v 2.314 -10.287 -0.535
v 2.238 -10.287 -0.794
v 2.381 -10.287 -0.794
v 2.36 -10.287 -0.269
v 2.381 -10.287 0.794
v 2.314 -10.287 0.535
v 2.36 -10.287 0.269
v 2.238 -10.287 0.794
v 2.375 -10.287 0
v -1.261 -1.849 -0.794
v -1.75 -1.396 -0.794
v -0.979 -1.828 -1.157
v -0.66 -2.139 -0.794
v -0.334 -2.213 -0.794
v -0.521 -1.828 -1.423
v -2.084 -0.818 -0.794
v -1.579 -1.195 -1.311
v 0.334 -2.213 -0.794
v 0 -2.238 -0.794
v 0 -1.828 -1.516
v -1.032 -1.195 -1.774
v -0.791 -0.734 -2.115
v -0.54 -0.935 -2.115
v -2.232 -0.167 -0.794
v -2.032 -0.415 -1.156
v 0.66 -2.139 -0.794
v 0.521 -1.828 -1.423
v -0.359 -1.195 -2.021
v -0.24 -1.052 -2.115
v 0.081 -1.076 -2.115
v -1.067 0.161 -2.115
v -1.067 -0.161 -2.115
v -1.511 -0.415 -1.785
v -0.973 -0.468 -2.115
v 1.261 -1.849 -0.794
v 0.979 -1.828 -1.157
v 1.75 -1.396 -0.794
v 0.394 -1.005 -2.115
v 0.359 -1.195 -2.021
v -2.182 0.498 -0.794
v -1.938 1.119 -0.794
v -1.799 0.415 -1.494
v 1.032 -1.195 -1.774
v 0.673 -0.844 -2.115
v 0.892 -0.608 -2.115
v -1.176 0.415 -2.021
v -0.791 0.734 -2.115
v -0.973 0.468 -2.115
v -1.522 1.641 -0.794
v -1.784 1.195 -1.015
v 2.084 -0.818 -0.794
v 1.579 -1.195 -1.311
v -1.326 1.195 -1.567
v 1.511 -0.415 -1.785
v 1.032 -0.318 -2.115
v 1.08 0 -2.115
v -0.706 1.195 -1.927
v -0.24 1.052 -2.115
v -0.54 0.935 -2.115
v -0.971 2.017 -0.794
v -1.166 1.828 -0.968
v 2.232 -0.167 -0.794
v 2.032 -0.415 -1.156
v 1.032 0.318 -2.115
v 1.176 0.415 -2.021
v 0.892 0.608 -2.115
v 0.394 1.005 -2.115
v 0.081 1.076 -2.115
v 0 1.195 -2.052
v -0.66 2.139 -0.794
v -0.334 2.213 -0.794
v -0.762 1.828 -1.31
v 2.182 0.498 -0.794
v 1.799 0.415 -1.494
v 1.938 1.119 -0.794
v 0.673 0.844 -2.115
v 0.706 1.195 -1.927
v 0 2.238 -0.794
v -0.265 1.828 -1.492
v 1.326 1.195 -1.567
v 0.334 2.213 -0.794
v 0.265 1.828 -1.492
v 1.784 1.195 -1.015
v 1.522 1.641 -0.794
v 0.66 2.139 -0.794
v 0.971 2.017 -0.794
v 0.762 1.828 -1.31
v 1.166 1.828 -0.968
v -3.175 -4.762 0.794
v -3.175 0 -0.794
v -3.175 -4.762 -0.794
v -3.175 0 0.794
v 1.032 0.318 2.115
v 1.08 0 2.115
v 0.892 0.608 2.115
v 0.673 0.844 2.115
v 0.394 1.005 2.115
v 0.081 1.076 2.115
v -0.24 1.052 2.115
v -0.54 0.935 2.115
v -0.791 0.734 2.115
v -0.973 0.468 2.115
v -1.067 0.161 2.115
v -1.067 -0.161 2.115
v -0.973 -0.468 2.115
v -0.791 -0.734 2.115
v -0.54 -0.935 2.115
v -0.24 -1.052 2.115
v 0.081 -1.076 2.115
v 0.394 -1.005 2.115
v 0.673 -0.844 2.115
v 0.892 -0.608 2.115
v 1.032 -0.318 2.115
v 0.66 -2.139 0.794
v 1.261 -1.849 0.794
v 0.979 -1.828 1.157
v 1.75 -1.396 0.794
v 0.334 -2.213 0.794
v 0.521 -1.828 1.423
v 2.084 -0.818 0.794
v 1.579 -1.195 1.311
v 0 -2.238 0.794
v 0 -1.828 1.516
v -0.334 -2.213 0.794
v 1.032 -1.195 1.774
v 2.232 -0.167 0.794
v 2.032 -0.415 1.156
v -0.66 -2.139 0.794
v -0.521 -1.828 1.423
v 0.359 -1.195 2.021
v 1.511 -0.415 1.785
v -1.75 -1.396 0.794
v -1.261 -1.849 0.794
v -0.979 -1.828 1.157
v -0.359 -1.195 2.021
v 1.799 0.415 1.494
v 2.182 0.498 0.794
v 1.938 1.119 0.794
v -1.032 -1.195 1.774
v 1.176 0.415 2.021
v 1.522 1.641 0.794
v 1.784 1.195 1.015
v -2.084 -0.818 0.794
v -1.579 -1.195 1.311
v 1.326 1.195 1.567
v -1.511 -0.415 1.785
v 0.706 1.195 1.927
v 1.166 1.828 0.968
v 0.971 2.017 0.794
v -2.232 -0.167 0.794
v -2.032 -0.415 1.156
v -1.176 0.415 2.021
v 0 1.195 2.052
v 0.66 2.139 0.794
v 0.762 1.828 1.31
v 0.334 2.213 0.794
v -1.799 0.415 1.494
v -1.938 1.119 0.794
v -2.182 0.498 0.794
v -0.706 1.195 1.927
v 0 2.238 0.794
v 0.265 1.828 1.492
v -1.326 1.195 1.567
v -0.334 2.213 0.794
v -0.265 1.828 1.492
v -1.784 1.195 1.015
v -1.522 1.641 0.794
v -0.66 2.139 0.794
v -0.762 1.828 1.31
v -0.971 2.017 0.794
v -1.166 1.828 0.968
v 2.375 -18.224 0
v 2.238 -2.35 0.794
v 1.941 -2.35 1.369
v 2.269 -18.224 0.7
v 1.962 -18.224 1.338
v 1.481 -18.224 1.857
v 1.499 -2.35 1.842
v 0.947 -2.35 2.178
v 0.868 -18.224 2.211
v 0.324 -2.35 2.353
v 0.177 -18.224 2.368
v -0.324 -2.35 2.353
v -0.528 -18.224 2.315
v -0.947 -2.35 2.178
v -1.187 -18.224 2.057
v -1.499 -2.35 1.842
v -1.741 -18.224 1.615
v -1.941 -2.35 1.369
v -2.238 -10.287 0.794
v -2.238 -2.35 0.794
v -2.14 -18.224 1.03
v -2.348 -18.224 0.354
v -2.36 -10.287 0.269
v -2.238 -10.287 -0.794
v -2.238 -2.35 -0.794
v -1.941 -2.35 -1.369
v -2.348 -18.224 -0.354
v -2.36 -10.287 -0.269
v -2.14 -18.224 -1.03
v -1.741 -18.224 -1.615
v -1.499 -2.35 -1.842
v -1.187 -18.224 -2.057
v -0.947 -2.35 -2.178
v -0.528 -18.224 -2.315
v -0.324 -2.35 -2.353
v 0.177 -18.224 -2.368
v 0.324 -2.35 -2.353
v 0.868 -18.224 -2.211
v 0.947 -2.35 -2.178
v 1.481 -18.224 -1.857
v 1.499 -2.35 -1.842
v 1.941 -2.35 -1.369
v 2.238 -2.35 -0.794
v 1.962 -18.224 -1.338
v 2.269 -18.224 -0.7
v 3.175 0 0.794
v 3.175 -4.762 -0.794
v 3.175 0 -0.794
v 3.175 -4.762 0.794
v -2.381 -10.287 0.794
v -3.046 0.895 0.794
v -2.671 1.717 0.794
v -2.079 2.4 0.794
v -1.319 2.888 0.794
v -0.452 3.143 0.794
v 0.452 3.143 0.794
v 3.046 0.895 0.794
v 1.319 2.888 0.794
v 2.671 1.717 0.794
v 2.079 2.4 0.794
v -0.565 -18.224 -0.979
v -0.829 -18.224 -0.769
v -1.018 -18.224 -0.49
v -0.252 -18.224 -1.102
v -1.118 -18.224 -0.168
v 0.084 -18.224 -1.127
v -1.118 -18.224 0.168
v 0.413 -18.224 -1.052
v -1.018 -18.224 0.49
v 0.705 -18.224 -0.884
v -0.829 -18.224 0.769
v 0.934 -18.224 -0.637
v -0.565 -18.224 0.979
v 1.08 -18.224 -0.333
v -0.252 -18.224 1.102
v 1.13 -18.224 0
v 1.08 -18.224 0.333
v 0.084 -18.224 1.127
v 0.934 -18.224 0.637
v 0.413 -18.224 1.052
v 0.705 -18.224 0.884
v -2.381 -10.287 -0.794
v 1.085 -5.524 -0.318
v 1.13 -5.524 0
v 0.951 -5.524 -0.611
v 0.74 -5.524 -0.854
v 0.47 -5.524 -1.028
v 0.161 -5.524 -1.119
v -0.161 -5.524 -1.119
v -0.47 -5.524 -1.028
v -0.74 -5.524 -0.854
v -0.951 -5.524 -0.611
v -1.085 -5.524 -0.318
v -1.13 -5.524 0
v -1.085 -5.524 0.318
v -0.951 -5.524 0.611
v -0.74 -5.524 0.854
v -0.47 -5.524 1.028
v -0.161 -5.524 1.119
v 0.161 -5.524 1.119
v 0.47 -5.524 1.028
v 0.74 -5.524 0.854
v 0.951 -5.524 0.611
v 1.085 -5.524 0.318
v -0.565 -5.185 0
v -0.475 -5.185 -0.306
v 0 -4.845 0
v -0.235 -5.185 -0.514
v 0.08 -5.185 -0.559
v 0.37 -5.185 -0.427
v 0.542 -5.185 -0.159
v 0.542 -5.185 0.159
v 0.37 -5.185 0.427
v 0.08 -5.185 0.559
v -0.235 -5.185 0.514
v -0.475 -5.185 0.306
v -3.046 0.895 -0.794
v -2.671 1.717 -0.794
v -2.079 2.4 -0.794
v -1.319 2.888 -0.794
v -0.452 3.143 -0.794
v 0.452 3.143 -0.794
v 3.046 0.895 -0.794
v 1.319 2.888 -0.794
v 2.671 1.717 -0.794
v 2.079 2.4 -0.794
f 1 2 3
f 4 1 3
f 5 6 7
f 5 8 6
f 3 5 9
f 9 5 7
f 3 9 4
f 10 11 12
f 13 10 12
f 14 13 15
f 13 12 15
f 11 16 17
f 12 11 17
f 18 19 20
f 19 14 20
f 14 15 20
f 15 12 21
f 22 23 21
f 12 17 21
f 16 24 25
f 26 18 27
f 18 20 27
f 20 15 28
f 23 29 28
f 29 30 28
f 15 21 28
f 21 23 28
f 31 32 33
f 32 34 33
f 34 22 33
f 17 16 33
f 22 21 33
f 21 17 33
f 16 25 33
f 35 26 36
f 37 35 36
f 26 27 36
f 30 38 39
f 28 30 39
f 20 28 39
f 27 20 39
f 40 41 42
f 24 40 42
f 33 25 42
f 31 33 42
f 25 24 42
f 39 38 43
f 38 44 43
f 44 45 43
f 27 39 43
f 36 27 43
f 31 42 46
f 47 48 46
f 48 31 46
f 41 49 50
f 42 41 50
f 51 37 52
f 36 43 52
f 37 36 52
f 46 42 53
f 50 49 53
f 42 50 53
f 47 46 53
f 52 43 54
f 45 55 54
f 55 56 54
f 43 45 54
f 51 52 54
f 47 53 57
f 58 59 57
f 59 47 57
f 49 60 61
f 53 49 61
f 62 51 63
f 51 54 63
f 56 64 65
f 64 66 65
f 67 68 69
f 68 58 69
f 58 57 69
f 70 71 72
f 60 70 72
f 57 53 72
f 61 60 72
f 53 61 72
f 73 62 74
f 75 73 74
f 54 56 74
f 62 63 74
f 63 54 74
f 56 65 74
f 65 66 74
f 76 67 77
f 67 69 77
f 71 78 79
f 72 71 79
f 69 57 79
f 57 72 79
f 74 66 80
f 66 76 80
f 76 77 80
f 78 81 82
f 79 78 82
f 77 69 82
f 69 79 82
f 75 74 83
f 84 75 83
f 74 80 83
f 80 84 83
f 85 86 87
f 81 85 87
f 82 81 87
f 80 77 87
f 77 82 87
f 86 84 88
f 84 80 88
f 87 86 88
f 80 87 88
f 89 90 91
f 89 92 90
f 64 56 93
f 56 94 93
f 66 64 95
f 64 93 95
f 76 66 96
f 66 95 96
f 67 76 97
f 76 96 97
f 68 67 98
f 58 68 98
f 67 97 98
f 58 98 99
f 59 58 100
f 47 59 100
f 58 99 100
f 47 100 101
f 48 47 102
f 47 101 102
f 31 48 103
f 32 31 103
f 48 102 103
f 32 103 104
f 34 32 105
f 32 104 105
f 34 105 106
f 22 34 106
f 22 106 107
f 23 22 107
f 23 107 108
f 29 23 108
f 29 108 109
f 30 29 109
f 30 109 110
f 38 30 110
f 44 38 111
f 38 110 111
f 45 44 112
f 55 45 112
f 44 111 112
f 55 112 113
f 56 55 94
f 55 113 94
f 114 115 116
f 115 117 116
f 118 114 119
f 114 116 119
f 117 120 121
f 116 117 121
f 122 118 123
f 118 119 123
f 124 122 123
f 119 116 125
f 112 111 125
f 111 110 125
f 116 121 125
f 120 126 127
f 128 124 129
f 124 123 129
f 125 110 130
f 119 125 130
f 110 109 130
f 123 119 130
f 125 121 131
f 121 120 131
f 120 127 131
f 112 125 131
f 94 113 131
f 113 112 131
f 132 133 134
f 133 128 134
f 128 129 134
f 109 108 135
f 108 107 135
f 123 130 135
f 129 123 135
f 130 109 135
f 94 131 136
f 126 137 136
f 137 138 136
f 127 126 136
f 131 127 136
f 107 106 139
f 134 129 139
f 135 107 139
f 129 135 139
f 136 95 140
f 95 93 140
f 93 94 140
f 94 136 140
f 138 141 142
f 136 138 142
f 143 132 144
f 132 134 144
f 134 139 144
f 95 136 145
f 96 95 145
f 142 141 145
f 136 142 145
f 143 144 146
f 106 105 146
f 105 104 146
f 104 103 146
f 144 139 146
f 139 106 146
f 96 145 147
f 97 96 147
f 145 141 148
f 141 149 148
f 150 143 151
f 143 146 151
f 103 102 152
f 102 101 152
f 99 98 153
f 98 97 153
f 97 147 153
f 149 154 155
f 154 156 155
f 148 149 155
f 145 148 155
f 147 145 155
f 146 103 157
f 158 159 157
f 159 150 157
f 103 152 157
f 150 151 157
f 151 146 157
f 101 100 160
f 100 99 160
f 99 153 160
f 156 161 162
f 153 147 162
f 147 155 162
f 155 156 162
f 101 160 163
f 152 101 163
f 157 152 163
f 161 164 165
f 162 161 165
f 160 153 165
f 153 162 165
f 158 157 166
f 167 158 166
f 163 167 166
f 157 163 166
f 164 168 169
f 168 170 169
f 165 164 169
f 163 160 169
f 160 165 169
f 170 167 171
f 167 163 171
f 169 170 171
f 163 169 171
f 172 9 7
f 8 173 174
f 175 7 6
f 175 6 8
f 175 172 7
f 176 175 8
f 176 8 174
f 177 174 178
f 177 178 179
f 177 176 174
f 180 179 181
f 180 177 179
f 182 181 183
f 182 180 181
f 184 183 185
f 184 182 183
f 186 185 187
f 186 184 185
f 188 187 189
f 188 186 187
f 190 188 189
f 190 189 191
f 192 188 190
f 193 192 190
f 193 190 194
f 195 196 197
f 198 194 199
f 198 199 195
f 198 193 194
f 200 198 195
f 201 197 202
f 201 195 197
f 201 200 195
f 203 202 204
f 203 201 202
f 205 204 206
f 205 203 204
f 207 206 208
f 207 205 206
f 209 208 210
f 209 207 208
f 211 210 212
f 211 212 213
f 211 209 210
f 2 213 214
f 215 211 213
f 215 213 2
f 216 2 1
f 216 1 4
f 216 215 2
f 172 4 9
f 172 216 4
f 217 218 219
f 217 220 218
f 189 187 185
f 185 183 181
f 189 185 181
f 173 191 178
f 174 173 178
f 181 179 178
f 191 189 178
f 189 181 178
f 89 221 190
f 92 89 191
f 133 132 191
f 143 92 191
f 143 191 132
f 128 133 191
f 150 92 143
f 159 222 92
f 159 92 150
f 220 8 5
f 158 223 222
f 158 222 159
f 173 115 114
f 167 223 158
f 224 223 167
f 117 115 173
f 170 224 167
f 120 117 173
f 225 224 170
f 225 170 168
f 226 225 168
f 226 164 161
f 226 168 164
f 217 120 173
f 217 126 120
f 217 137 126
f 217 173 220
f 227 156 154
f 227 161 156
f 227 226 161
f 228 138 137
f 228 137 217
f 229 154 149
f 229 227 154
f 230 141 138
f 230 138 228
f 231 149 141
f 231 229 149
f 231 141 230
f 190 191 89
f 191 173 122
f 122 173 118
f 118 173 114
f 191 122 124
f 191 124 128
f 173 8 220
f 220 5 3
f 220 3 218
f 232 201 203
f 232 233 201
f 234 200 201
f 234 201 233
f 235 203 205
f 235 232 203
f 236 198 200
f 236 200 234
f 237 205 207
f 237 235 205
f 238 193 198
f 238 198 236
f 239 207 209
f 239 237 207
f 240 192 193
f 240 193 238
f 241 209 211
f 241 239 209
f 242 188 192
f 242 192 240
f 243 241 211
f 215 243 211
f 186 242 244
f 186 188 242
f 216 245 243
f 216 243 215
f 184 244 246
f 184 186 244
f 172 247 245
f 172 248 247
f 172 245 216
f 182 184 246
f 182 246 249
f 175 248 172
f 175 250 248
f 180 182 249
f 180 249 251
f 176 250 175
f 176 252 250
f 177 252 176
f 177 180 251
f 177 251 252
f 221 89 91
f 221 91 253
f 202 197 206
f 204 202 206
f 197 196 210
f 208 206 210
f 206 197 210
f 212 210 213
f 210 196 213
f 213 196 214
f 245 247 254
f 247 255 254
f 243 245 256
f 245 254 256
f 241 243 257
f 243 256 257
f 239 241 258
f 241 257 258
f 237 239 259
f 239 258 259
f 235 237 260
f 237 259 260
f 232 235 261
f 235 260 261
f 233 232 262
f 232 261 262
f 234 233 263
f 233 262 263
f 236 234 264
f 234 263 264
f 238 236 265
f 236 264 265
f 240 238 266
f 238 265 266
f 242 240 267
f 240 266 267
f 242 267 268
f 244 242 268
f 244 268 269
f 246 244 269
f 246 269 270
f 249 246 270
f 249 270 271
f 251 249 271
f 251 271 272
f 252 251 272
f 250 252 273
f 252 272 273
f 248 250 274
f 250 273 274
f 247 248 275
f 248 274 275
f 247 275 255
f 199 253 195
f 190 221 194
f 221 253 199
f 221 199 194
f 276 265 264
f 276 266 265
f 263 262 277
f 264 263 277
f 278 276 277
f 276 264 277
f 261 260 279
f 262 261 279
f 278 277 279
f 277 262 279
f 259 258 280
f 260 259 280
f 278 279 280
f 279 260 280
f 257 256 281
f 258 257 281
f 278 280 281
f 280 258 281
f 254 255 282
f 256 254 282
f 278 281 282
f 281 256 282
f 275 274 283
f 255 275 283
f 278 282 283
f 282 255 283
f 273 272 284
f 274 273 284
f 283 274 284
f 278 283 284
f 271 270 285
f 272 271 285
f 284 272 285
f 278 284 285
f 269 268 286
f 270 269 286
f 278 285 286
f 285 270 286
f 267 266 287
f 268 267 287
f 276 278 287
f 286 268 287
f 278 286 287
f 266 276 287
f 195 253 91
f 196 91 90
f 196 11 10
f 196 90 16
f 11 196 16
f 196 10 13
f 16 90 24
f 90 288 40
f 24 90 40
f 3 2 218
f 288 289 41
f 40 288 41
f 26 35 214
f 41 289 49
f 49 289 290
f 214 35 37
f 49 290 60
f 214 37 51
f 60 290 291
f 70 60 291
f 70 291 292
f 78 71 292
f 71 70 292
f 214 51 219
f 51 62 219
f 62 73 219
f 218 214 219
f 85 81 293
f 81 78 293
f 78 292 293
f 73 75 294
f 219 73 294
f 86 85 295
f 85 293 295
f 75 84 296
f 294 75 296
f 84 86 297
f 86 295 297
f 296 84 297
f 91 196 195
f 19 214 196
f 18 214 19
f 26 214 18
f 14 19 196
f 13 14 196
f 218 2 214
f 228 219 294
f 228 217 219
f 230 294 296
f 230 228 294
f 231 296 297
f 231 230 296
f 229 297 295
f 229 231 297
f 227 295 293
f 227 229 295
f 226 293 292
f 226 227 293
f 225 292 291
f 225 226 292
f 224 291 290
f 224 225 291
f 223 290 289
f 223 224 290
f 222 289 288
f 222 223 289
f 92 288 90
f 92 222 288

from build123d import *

# Parameters (mm, degrees)
SKETCH3_R                 = 1.0795
CUT_EXTRUDE1_DEPTH        = 3.3749
CUT_EXTRUDE1_DEPTH_BACK   = 3.3749
SKETCH4_R                 = 1.0795
BOSS_EXTRUDE1_DEPTH       = 0.79375
SKETCH5_R                 = 2.3749
BOSS_EXTRUDE2_DEPTH       = 7.9375
F_4_40_TAPPED_HOLE1_D     = 2.2606
F_4_40_TAPPED_HOLE1_DEPTH = 12.7
F_4_40_TAPPED_HOLE1_TIP   = 0.679152758


with BuildPart() as part:
    # Sketch2 → Revolve1 (revolve)
    with BuildSketch(Plane.XY):
        with BuildLine():
            Line((0, 2.3749), (0, -2.3749))
            ThreePointArc((0, -2.3749), (2.3749, 0), (0, 2.3749))
        make_face()
    revolve(axis=Axis((0, 6.043929029, 0), (0, -1, 0)))

    # Sketch3 → Cut-Extrude1 (cut, two sides)
    with BuildSketch(Plane.XY) as cut_extrude1_sk:
        Circle(SKETCH3_R)
    extrude(amount=CUT_EXTRUDE1_DEPTH, mode=Mode.SUBTRACT)
    extrude(cut_extrude1_sk.sketch, amount=-CUT_EXTRUDE1_DEPTH_BACK, mode=Mode.SUBTRACT)

    # Sketch4 → Boss-Extrude1 (add, symmetric)
    with BuildSketch(Plane.XY):
        with BuildLine():
            Line((-3.175, 0), (-3.175, -4.7625))
            Line((-3.175, -4.7625), (-2.38125, -10.287))
            Line((-2.38125, -10.287), (2.38125, -10.287))
            Line((2.38125, -10.287), (3.175, -4.7625))
            Line((3.175, -4.7625), (3.175, 0))
            ThreePointArc((3.175, 0), (0, 3.175), (-3.175, 0))
        make_face()
        Circle(SKETCH4_R, mode=Mode.SUBTRACT)
    extrude(amount=BOSS_EXTRUDE1_DEPTH, both=True)

    # Sketch5 → Boss-Extrude2 (add, symmetric)
    with BuildSketch(Plane.XZ.offset(10.287)):
        Circle(SKETCH5_R)
    extrude(amount=BOSS_EXTRUDE2_DEPTH, both=True)

    # #4-40 Tapped Hole1
    with Locations(Plane(origin=(0, -18.2245, 0), x_dir=(-1, 0, 0), z_dir=(0, -1, 0))):
        with Locations((0, 0)):
            Hole(F_4_40_TAPPED_HOLE1_D / 2, depth=F_4_40_TAPPED_HOLE1_DEPTH)
            with Locations((0, 0, -(F_4_40_TAPPED_HOLE1_DEPTH + F_4_40_TAPPED_HOLE1_TIP / 2))):  # 118° drill point
                Cone(0, F_4_40_TAPPED_HOLE1_D / 2, F_4_40_TAPPED_HOLE1_TIP, mode=Mode.SUBTRACT)


solid = part.part
